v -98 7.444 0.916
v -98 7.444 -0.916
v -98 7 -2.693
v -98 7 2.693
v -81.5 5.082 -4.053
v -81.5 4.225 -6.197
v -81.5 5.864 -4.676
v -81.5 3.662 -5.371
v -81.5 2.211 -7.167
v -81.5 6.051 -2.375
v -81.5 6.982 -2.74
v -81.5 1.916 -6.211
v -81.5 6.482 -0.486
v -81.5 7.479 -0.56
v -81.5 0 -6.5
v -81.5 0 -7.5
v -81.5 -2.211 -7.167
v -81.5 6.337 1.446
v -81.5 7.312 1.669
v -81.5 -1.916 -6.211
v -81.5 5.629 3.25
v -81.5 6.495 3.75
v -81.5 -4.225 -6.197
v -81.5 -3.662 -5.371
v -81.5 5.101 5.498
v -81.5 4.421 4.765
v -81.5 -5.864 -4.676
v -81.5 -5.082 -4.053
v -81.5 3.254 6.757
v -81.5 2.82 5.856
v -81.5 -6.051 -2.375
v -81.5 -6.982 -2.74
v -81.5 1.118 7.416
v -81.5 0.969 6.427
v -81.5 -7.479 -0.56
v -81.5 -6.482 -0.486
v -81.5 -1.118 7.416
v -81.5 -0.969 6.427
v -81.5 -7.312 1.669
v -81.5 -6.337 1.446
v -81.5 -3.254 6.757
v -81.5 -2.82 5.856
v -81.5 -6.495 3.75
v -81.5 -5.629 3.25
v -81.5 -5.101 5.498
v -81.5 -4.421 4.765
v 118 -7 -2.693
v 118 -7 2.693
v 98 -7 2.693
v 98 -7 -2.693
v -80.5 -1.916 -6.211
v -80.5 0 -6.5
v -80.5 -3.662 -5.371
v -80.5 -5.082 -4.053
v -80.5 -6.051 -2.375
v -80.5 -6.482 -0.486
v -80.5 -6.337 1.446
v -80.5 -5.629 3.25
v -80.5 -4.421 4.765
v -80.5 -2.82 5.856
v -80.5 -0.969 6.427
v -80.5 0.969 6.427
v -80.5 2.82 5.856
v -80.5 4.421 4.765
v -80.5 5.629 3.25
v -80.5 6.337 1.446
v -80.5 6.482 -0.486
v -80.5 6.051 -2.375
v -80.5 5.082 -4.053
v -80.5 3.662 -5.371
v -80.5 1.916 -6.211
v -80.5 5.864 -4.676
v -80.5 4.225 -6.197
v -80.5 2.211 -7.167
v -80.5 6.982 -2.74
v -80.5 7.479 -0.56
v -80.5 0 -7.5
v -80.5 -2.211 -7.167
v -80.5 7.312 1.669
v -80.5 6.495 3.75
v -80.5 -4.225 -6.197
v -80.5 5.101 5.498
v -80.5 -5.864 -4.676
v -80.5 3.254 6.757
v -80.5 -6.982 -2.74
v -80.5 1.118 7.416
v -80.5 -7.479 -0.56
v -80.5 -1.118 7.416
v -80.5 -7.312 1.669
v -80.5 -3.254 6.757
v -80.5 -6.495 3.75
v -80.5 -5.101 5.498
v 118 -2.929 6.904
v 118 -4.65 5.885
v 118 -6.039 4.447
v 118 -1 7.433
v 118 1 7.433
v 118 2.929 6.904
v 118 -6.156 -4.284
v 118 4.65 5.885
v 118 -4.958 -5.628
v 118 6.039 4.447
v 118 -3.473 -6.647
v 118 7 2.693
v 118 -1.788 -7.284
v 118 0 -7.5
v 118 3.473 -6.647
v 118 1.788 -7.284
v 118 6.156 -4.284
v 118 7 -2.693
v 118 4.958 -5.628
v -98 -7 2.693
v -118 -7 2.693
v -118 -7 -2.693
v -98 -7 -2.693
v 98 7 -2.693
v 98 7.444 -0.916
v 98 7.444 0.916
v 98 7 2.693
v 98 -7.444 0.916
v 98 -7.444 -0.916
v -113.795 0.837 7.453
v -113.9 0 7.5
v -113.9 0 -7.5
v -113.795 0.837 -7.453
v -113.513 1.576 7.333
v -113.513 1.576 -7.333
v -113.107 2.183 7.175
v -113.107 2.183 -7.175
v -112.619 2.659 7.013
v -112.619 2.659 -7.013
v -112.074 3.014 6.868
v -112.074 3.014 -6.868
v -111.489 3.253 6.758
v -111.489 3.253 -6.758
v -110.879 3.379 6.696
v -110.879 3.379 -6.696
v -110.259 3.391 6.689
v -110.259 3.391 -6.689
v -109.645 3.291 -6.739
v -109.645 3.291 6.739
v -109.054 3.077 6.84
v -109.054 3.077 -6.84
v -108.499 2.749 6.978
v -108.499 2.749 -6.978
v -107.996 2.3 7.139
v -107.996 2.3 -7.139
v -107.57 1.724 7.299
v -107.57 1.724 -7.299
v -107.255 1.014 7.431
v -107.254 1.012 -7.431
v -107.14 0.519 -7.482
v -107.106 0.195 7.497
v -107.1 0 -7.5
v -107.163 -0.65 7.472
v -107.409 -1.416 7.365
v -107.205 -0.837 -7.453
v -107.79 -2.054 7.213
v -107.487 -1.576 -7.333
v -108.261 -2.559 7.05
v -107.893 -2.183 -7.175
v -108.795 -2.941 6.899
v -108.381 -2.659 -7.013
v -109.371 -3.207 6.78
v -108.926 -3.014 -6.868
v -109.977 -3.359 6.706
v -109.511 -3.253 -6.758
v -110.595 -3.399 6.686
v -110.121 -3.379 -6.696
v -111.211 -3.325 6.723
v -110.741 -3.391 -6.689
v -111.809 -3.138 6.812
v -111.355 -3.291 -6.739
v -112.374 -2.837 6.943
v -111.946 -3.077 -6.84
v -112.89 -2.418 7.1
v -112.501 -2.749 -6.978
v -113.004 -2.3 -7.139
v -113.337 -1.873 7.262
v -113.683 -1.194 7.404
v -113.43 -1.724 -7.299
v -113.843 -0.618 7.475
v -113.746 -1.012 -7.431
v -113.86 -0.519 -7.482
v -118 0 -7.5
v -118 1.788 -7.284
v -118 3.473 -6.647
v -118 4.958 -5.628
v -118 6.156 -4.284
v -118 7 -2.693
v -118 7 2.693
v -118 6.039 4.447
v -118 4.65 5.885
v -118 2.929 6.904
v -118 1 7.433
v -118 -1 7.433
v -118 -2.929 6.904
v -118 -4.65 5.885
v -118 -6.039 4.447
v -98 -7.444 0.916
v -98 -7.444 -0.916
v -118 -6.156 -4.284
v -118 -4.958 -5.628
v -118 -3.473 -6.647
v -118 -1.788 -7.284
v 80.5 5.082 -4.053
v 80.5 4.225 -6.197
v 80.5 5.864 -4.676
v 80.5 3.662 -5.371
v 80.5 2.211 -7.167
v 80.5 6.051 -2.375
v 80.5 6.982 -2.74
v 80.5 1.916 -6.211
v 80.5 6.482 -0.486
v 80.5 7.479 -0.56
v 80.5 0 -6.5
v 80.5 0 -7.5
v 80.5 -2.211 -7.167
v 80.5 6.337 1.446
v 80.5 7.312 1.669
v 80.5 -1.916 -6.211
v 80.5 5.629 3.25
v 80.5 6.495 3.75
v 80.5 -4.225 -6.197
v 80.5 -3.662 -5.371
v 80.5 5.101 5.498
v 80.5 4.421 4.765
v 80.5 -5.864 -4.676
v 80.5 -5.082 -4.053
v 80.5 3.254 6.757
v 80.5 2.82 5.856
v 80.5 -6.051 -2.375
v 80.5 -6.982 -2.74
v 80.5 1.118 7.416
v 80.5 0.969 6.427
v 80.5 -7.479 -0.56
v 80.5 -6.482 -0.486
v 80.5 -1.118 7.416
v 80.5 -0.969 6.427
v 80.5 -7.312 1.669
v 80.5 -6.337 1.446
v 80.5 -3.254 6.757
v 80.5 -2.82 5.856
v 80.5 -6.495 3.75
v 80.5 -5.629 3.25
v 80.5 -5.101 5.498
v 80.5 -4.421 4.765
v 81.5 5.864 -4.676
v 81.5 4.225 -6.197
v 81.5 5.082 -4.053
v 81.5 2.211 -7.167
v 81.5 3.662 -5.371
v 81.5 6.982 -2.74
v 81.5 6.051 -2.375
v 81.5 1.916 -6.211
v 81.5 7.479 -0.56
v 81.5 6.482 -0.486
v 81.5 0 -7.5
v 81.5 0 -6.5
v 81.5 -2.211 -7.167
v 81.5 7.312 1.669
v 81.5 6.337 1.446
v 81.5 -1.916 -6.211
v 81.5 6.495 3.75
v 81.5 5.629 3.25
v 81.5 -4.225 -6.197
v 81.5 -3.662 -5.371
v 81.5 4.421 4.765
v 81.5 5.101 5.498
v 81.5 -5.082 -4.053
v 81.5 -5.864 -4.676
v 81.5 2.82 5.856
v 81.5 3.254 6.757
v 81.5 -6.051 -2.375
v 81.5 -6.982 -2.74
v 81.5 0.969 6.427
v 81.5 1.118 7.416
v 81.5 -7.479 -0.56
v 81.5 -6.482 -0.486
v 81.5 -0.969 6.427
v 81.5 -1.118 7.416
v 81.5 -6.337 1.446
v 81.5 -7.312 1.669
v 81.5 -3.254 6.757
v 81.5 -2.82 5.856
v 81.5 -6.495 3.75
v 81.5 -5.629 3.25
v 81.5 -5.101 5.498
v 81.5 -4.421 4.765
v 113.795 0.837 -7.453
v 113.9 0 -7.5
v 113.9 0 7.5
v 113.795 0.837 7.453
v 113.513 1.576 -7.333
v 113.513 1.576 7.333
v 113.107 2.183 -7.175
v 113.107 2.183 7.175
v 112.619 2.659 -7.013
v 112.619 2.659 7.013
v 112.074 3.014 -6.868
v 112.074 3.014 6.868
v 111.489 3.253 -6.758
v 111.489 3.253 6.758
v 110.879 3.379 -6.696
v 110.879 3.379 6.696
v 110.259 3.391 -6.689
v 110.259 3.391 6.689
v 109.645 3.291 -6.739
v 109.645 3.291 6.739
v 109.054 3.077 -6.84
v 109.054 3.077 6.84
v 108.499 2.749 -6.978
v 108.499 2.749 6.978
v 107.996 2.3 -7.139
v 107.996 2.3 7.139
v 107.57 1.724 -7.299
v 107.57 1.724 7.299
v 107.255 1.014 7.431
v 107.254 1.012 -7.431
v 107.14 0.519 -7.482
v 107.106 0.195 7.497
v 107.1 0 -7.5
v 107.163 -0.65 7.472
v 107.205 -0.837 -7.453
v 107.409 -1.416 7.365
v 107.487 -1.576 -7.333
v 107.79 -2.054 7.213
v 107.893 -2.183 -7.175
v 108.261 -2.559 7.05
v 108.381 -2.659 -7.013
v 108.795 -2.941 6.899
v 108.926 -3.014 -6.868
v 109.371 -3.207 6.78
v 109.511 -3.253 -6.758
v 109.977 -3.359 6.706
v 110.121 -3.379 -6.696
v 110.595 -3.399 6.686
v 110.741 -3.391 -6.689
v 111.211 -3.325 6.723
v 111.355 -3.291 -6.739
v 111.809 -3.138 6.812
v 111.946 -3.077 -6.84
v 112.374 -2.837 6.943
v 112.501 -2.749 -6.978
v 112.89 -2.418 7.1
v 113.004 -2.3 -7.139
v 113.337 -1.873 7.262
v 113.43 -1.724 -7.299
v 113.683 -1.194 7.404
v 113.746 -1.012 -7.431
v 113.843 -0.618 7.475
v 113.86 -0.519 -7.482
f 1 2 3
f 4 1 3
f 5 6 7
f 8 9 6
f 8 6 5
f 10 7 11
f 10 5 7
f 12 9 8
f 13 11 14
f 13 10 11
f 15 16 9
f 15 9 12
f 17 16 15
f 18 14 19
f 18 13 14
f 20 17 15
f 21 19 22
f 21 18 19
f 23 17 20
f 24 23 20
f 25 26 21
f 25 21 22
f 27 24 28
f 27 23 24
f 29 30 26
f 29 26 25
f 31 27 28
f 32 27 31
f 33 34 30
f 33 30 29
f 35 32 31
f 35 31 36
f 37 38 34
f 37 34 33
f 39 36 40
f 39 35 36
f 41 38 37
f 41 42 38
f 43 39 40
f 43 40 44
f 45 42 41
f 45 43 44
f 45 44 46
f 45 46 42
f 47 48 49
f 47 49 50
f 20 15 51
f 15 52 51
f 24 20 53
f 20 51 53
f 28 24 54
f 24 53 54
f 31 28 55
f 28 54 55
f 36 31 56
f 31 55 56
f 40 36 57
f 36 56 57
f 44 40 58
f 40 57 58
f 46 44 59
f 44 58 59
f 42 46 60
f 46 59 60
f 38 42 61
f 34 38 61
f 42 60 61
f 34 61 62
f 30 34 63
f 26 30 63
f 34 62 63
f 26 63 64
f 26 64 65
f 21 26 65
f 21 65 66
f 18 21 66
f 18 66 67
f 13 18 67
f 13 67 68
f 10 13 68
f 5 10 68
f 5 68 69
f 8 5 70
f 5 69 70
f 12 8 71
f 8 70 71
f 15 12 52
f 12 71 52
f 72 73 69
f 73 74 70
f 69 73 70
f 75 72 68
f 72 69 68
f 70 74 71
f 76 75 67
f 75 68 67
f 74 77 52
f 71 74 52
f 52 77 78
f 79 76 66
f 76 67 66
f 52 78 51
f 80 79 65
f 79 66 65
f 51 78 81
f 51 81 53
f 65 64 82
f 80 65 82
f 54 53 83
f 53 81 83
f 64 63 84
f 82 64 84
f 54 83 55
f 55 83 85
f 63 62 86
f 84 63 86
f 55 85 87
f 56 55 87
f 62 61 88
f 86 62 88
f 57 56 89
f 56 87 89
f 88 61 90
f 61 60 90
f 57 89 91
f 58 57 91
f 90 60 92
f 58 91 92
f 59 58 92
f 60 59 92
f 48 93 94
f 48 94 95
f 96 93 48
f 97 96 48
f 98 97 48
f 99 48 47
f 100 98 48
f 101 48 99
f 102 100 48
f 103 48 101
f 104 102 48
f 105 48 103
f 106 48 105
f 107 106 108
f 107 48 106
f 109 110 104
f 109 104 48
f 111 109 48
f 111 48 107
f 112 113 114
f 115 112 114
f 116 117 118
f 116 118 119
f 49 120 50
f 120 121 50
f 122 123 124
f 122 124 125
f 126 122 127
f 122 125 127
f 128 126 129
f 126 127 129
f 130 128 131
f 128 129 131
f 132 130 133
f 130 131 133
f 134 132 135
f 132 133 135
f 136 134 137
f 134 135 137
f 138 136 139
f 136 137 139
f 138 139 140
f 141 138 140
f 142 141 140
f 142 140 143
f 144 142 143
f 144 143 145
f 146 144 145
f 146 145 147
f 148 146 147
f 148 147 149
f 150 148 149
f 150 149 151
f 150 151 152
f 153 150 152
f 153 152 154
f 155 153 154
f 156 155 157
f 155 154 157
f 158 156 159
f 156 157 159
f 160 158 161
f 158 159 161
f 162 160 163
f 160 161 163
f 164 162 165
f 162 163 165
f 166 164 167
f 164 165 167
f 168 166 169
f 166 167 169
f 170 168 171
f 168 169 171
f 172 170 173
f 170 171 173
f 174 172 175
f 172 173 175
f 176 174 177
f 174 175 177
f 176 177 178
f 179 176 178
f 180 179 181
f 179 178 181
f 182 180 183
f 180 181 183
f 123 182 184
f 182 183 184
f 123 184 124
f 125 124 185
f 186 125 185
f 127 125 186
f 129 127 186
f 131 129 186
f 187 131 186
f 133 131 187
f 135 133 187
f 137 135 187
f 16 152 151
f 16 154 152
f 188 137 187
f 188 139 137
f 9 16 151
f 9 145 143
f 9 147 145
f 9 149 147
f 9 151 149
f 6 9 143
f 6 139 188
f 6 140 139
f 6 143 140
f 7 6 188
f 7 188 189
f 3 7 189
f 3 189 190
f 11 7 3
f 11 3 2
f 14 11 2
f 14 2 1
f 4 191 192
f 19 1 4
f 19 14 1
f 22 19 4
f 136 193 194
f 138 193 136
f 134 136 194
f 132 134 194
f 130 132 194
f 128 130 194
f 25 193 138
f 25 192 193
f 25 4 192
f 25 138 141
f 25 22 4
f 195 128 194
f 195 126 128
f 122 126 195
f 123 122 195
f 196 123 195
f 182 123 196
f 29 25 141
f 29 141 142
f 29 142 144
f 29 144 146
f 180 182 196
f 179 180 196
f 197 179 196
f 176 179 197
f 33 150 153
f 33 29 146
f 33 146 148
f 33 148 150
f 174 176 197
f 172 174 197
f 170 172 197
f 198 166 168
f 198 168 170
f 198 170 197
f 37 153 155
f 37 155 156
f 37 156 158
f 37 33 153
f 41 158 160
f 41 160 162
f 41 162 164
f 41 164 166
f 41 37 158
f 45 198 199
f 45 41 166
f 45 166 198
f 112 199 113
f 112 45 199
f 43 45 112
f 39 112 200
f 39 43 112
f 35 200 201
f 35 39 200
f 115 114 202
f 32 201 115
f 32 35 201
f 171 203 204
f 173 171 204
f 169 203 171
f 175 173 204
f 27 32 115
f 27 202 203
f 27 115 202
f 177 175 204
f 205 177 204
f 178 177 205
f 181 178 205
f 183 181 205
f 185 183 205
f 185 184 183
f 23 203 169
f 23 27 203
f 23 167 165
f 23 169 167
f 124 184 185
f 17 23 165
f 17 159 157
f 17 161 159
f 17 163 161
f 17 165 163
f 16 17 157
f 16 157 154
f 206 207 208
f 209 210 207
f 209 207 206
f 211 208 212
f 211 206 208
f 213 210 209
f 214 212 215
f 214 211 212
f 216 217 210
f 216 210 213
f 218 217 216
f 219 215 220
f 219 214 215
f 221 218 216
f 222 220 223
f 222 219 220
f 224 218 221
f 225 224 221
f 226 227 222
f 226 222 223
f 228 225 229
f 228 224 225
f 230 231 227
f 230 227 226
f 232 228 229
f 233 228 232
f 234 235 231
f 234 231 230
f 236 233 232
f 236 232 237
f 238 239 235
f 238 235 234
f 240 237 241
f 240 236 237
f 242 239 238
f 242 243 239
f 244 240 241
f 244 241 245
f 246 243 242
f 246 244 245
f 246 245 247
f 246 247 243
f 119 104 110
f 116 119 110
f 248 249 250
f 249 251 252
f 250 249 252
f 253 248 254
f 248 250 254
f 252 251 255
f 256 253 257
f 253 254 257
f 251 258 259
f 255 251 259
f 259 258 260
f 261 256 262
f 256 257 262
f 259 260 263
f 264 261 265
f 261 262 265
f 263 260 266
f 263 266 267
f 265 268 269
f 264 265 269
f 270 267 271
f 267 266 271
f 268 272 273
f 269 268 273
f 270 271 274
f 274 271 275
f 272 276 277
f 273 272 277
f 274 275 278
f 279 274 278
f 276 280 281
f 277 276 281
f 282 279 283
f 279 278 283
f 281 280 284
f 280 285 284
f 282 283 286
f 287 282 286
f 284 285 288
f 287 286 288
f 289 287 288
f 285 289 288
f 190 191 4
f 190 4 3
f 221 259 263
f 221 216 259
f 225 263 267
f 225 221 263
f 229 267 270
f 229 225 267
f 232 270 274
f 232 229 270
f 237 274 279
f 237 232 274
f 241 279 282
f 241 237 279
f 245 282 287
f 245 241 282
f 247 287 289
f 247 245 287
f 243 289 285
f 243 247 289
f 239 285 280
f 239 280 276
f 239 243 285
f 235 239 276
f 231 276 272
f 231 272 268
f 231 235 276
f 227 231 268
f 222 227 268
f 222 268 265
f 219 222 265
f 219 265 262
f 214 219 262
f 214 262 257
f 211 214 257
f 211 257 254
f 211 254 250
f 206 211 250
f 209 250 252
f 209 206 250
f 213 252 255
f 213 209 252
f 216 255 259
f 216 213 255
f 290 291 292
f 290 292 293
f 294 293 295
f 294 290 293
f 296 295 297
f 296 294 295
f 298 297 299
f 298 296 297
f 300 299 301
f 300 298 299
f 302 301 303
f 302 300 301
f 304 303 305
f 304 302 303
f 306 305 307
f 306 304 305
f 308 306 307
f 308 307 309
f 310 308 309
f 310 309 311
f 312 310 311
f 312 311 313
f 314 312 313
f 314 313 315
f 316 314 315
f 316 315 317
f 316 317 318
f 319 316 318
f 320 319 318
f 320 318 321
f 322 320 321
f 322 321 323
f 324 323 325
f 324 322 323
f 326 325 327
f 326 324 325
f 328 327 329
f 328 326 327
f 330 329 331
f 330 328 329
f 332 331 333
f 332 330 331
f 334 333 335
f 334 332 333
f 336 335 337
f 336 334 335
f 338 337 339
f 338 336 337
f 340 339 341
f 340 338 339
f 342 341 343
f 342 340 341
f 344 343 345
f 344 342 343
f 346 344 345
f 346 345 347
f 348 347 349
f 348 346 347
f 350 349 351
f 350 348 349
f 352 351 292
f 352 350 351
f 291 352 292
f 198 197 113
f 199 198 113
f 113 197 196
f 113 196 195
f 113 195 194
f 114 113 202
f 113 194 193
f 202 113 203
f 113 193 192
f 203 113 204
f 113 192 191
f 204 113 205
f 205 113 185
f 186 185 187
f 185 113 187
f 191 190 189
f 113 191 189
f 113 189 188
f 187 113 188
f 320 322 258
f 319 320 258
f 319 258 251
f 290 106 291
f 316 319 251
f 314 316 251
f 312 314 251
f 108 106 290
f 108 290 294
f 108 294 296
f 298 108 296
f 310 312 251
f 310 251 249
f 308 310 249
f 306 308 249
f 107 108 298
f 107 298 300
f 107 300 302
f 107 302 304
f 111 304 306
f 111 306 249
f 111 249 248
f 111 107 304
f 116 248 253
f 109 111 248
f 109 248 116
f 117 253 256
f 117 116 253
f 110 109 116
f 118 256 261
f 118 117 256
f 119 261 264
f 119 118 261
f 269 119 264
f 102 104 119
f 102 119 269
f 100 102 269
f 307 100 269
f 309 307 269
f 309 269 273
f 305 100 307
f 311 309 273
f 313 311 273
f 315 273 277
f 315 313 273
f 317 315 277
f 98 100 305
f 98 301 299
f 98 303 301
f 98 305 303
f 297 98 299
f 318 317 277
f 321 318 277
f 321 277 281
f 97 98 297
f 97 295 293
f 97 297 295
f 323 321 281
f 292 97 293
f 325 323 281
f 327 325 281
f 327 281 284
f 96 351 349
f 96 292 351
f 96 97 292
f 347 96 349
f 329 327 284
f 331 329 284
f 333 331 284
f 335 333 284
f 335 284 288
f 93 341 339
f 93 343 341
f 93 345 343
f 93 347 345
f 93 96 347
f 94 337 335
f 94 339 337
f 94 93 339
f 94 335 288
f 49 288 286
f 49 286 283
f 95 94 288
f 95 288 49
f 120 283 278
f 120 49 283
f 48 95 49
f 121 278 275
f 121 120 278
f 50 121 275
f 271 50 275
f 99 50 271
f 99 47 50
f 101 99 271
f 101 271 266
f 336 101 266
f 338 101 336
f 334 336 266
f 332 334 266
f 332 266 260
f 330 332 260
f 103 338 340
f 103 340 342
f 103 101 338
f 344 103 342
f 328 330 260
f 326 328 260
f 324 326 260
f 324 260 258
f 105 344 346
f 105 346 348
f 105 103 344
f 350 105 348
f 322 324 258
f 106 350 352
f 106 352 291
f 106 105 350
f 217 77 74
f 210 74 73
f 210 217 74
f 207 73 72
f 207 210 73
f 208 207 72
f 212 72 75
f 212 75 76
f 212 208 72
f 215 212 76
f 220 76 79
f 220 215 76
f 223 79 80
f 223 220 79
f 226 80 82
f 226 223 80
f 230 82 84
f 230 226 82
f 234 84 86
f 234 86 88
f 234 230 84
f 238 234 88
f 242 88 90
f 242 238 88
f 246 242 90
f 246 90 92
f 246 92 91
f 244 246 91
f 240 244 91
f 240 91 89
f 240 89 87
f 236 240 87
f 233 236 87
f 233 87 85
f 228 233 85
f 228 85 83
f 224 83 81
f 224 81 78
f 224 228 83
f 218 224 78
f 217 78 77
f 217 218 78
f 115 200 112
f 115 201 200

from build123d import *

# Parameters (mm, degrees)
IZIM1_R                     = 7.5
Y_KSEKLIK_EKSTR_ZYON1_DEPTH = 118
IZIM2_W                     = 1
IZIM2_H                     = 2
KES_EKSTR_ZYON1_DEPTH       = 20
M8_DI_LI_DELIK1_D           = 6.8
AYNALAMA3_COPY_1_DEPTH      = 20


with BuildPart() as part:
    # Çizim1 → Yükseklik-Ekstrüzyon1 (new, symmetric)
    with BuildSketch(Plane(origin=(0, 0, 0), x_dir=(0, 0, -1), z_dir=(1, 0, 0))):
        Circle(IZIM1_R)
    extrude(amount=Y_KSEKLIK_EKSTR_ZYON1_DEPTH, both=True)

    # Çizim2 → Kes-Döndür2 (revolve, cut)
    with BuildSketch(Plane.XY, mode=Mode.PRIVATE) as kes_d_nd_r2_sk:
        with Locations((-81, 7.5)):
            Rectangle(IZIM2_W, IZIM2_H)
    kes_d_nd_r2 = revolve(kes_d_nd_r2_sk.sketch.rotate(Axis((0, 0, 0), (-1, 0, 0)), 90), axis=Axis((0, 0, 0), (-1, 0, 0)), mode=Mode.SUBTRACT)

    # Çizim3 → Kes-Ekstrüzyon1 (cut)
    with BuildSketch(Plane.ZY.offset(118)):
        Polygon((5.217035769, 7), (-5.217035769, 7), (-0.675959806, 12.212790329), align=None)
    kes_ekstr_zyon1 = extrude(amount=-KES_EKSTR_ZYON1_DEPTH, mode=Mode.SUBTRACT)

    # Aynalama2: Kes-Ekstrüzyon1 across plane
    add(kes_ekstr_zyon1.mirror(Plane.ZX), mode=Mode.SUBTRACT)

    # M8 Dişli Delik1 (through all)
    with Locations(Plane.XY.offset(12)):
        with Locations((-110.5, 0)):
            m8_di_li_delik1 = Hole(M8_DI_LI_DELIK1_D / 2)

    # Aynalama3: Kes-Döndür2, Kes-Ekstrüzyon1, M8 Dişli Delik1 across plane
    add(kes_d_nd_r2.mirror(Plane(origin=(0, 0, 0), x_dir=(0, 0, 1), z_dir=(1, 0, 0))), mode=Mode.SUBTRACT)
    add(kes_ekstr_zyon1.mirror(Plane(origin=(0, 0, 0), x_dir=(0, 0, 1), z_dir=(1, 0, 0))), mode=Mode.SUBTRACT)
    add(m8_di_li_delik1.mirror(Plane(origin=(0, 0, 0), x_dir=(0, 0, 1), z_dir=(1, 0, 0))), mode=Mode.SUBTRACT)

    # Aynalama3 copy 1 sketch → Aynalama3 copy 1 (cut)
    with BuildSketch(Plane(origin=(118, 0, 0), x_dir=(0, 0, 1), z_dir=(1, 0, 0))):
        Polygon((5.217035769, 7), (-5.217035769, 7), (-0.675959806, 12.212790329), align=None)
    extrude(amount=-AYNALAMA3_COPY_1_DEPTH, mode=Mode.SUBTRACT)


solid = part.part
